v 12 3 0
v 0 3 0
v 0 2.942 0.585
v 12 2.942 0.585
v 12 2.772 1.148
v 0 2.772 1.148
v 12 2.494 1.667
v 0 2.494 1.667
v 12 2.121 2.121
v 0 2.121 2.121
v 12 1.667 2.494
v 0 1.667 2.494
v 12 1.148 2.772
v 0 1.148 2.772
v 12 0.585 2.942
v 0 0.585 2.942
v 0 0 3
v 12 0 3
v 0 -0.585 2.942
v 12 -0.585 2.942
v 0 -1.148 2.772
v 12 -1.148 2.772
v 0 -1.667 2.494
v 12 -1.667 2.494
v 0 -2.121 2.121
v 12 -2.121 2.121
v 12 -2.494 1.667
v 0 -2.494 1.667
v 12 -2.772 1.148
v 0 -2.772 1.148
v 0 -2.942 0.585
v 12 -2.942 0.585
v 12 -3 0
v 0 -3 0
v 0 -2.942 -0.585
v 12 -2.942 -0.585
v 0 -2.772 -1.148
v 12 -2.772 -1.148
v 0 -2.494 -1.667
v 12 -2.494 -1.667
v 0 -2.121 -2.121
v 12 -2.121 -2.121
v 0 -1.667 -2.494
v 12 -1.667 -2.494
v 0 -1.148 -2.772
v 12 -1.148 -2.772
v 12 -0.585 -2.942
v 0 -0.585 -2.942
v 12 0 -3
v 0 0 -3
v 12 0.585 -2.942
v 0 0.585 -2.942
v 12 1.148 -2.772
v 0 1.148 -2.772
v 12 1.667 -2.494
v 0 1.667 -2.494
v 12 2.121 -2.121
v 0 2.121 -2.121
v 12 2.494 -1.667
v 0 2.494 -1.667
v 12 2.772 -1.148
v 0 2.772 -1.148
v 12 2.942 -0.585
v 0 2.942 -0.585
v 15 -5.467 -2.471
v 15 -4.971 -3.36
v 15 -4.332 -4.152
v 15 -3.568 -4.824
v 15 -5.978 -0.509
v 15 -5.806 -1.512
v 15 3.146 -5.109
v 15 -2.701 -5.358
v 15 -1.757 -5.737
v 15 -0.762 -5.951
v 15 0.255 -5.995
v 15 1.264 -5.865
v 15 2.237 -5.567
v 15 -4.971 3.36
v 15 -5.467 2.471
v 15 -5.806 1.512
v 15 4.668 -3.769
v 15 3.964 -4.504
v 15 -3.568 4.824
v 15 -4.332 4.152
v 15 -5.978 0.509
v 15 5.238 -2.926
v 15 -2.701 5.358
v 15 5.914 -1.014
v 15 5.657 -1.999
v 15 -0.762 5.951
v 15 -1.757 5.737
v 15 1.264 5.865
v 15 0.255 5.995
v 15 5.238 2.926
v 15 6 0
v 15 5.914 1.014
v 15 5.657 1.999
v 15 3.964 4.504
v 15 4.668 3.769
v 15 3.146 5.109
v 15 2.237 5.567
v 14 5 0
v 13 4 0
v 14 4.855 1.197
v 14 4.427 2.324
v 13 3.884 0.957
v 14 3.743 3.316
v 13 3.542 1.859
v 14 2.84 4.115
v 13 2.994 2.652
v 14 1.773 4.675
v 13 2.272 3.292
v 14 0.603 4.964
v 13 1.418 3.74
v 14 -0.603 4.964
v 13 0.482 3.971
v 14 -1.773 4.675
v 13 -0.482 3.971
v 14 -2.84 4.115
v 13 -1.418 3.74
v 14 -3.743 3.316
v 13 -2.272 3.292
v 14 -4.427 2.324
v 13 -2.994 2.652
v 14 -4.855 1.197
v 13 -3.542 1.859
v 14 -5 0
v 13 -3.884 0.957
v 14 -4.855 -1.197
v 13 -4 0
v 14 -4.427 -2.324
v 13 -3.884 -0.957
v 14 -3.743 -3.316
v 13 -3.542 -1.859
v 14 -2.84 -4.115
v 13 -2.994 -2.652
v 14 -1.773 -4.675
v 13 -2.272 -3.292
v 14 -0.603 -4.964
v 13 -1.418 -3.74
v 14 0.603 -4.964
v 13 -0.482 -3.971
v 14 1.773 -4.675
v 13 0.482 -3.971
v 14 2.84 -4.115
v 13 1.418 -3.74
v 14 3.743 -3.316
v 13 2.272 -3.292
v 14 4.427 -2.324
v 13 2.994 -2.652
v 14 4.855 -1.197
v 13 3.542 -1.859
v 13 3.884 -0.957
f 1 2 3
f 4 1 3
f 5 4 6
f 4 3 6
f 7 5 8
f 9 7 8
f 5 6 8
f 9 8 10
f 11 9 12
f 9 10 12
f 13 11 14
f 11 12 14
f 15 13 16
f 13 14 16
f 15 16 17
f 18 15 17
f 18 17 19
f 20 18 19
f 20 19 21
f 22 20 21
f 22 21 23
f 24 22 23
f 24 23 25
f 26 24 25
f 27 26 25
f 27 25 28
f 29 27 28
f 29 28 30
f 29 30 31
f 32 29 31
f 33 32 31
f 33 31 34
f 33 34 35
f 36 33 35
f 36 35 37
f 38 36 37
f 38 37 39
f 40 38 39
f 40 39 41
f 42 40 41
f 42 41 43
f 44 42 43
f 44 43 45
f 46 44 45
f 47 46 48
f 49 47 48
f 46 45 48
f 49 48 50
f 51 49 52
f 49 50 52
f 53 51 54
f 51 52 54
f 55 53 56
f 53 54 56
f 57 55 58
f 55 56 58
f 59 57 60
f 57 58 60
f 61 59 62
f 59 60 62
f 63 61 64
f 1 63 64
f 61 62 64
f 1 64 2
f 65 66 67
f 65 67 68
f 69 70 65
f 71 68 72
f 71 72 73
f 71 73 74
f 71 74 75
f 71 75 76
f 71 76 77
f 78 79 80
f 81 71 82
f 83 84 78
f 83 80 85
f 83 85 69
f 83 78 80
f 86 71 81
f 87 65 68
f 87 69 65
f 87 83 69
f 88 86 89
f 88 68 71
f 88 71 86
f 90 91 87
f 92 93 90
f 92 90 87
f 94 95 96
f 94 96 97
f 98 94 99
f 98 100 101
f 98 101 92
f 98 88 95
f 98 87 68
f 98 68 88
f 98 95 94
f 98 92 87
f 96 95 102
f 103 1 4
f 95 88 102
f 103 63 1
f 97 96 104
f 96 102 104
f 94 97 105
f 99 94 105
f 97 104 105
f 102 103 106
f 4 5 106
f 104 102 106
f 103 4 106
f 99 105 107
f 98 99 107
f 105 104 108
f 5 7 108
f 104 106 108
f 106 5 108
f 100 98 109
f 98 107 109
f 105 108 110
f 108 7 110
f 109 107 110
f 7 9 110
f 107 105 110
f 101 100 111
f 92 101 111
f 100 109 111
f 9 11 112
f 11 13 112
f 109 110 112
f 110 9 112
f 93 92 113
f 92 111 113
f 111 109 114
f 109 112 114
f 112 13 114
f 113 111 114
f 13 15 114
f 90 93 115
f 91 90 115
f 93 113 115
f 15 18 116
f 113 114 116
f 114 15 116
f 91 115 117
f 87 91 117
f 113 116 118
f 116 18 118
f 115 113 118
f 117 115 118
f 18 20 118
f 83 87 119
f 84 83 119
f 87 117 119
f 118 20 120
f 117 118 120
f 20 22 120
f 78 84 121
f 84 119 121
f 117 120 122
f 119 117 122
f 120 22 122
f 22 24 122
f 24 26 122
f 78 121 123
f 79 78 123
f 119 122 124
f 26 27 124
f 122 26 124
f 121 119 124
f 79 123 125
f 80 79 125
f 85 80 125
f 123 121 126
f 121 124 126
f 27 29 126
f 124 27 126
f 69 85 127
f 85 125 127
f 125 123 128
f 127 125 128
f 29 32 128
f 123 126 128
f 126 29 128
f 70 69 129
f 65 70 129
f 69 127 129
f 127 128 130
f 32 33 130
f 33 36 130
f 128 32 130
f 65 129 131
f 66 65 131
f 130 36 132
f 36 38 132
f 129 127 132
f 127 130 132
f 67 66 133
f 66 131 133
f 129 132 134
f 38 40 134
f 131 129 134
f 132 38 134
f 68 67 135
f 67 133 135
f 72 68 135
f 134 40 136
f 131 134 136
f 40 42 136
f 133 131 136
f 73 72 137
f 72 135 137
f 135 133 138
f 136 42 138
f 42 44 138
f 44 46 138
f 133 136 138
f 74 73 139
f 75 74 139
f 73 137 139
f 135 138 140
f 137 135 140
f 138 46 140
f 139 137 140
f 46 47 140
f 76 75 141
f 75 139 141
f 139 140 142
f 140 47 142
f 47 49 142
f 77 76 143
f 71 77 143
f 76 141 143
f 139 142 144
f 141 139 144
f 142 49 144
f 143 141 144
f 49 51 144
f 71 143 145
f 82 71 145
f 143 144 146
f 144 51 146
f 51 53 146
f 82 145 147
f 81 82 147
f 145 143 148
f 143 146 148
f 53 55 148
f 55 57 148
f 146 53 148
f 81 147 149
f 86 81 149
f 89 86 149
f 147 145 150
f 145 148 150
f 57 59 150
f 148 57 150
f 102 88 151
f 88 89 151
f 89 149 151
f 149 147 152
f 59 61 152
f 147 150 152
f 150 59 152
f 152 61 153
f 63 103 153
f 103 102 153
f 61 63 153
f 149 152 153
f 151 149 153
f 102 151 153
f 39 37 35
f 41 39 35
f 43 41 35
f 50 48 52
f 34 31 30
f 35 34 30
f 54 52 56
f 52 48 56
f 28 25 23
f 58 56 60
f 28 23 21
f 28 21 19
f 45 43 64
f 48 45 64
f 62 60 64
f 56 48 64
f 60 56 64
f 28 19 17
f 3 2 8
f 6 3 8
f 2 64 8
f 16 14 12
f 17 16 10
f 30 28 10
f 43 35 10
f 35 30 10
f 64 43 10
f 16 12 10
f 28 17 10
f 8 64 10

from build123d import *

# Parameters (mm, degrees)
F0_R     = 3
F1_DEPTH = 15
F2_R     = 6
F2_R_2   = 3
F3_DEPTH = 3
F4_SIZE  = 2.99999


# Not quite as in the source:
# - a fillet or chamfer is up to 0.001 mm smaller than in the source, because OpenCascade refuses the exact size


with BuildPart() as f1:
    # F0 (on Right) → F1 (new body)
    with BuildSketch(Plane.YZ):
        Circle(F0_R)
    extrude(amount=F1_DEPTH)

    # F2 (on face) → F3 (join)
    with BuildSketch(Plane.YZ.offset(15)):
        Circle(F2_R)
        Circle(F2_R_2, mode=Mode.SUBTRACT)
    extrude(amount=-F3_DEPTH)

    # F4 (size 3 in the source; OpenCascade refuses exactly that, so slightly less here)
    f4_edges = [f1.edges().sort_by_distance(p)[0] for p in [
        (12, -6, 0),
    ]]
    chamfer(f4_edges, length=F4_SIZE)


solid = f1.part
